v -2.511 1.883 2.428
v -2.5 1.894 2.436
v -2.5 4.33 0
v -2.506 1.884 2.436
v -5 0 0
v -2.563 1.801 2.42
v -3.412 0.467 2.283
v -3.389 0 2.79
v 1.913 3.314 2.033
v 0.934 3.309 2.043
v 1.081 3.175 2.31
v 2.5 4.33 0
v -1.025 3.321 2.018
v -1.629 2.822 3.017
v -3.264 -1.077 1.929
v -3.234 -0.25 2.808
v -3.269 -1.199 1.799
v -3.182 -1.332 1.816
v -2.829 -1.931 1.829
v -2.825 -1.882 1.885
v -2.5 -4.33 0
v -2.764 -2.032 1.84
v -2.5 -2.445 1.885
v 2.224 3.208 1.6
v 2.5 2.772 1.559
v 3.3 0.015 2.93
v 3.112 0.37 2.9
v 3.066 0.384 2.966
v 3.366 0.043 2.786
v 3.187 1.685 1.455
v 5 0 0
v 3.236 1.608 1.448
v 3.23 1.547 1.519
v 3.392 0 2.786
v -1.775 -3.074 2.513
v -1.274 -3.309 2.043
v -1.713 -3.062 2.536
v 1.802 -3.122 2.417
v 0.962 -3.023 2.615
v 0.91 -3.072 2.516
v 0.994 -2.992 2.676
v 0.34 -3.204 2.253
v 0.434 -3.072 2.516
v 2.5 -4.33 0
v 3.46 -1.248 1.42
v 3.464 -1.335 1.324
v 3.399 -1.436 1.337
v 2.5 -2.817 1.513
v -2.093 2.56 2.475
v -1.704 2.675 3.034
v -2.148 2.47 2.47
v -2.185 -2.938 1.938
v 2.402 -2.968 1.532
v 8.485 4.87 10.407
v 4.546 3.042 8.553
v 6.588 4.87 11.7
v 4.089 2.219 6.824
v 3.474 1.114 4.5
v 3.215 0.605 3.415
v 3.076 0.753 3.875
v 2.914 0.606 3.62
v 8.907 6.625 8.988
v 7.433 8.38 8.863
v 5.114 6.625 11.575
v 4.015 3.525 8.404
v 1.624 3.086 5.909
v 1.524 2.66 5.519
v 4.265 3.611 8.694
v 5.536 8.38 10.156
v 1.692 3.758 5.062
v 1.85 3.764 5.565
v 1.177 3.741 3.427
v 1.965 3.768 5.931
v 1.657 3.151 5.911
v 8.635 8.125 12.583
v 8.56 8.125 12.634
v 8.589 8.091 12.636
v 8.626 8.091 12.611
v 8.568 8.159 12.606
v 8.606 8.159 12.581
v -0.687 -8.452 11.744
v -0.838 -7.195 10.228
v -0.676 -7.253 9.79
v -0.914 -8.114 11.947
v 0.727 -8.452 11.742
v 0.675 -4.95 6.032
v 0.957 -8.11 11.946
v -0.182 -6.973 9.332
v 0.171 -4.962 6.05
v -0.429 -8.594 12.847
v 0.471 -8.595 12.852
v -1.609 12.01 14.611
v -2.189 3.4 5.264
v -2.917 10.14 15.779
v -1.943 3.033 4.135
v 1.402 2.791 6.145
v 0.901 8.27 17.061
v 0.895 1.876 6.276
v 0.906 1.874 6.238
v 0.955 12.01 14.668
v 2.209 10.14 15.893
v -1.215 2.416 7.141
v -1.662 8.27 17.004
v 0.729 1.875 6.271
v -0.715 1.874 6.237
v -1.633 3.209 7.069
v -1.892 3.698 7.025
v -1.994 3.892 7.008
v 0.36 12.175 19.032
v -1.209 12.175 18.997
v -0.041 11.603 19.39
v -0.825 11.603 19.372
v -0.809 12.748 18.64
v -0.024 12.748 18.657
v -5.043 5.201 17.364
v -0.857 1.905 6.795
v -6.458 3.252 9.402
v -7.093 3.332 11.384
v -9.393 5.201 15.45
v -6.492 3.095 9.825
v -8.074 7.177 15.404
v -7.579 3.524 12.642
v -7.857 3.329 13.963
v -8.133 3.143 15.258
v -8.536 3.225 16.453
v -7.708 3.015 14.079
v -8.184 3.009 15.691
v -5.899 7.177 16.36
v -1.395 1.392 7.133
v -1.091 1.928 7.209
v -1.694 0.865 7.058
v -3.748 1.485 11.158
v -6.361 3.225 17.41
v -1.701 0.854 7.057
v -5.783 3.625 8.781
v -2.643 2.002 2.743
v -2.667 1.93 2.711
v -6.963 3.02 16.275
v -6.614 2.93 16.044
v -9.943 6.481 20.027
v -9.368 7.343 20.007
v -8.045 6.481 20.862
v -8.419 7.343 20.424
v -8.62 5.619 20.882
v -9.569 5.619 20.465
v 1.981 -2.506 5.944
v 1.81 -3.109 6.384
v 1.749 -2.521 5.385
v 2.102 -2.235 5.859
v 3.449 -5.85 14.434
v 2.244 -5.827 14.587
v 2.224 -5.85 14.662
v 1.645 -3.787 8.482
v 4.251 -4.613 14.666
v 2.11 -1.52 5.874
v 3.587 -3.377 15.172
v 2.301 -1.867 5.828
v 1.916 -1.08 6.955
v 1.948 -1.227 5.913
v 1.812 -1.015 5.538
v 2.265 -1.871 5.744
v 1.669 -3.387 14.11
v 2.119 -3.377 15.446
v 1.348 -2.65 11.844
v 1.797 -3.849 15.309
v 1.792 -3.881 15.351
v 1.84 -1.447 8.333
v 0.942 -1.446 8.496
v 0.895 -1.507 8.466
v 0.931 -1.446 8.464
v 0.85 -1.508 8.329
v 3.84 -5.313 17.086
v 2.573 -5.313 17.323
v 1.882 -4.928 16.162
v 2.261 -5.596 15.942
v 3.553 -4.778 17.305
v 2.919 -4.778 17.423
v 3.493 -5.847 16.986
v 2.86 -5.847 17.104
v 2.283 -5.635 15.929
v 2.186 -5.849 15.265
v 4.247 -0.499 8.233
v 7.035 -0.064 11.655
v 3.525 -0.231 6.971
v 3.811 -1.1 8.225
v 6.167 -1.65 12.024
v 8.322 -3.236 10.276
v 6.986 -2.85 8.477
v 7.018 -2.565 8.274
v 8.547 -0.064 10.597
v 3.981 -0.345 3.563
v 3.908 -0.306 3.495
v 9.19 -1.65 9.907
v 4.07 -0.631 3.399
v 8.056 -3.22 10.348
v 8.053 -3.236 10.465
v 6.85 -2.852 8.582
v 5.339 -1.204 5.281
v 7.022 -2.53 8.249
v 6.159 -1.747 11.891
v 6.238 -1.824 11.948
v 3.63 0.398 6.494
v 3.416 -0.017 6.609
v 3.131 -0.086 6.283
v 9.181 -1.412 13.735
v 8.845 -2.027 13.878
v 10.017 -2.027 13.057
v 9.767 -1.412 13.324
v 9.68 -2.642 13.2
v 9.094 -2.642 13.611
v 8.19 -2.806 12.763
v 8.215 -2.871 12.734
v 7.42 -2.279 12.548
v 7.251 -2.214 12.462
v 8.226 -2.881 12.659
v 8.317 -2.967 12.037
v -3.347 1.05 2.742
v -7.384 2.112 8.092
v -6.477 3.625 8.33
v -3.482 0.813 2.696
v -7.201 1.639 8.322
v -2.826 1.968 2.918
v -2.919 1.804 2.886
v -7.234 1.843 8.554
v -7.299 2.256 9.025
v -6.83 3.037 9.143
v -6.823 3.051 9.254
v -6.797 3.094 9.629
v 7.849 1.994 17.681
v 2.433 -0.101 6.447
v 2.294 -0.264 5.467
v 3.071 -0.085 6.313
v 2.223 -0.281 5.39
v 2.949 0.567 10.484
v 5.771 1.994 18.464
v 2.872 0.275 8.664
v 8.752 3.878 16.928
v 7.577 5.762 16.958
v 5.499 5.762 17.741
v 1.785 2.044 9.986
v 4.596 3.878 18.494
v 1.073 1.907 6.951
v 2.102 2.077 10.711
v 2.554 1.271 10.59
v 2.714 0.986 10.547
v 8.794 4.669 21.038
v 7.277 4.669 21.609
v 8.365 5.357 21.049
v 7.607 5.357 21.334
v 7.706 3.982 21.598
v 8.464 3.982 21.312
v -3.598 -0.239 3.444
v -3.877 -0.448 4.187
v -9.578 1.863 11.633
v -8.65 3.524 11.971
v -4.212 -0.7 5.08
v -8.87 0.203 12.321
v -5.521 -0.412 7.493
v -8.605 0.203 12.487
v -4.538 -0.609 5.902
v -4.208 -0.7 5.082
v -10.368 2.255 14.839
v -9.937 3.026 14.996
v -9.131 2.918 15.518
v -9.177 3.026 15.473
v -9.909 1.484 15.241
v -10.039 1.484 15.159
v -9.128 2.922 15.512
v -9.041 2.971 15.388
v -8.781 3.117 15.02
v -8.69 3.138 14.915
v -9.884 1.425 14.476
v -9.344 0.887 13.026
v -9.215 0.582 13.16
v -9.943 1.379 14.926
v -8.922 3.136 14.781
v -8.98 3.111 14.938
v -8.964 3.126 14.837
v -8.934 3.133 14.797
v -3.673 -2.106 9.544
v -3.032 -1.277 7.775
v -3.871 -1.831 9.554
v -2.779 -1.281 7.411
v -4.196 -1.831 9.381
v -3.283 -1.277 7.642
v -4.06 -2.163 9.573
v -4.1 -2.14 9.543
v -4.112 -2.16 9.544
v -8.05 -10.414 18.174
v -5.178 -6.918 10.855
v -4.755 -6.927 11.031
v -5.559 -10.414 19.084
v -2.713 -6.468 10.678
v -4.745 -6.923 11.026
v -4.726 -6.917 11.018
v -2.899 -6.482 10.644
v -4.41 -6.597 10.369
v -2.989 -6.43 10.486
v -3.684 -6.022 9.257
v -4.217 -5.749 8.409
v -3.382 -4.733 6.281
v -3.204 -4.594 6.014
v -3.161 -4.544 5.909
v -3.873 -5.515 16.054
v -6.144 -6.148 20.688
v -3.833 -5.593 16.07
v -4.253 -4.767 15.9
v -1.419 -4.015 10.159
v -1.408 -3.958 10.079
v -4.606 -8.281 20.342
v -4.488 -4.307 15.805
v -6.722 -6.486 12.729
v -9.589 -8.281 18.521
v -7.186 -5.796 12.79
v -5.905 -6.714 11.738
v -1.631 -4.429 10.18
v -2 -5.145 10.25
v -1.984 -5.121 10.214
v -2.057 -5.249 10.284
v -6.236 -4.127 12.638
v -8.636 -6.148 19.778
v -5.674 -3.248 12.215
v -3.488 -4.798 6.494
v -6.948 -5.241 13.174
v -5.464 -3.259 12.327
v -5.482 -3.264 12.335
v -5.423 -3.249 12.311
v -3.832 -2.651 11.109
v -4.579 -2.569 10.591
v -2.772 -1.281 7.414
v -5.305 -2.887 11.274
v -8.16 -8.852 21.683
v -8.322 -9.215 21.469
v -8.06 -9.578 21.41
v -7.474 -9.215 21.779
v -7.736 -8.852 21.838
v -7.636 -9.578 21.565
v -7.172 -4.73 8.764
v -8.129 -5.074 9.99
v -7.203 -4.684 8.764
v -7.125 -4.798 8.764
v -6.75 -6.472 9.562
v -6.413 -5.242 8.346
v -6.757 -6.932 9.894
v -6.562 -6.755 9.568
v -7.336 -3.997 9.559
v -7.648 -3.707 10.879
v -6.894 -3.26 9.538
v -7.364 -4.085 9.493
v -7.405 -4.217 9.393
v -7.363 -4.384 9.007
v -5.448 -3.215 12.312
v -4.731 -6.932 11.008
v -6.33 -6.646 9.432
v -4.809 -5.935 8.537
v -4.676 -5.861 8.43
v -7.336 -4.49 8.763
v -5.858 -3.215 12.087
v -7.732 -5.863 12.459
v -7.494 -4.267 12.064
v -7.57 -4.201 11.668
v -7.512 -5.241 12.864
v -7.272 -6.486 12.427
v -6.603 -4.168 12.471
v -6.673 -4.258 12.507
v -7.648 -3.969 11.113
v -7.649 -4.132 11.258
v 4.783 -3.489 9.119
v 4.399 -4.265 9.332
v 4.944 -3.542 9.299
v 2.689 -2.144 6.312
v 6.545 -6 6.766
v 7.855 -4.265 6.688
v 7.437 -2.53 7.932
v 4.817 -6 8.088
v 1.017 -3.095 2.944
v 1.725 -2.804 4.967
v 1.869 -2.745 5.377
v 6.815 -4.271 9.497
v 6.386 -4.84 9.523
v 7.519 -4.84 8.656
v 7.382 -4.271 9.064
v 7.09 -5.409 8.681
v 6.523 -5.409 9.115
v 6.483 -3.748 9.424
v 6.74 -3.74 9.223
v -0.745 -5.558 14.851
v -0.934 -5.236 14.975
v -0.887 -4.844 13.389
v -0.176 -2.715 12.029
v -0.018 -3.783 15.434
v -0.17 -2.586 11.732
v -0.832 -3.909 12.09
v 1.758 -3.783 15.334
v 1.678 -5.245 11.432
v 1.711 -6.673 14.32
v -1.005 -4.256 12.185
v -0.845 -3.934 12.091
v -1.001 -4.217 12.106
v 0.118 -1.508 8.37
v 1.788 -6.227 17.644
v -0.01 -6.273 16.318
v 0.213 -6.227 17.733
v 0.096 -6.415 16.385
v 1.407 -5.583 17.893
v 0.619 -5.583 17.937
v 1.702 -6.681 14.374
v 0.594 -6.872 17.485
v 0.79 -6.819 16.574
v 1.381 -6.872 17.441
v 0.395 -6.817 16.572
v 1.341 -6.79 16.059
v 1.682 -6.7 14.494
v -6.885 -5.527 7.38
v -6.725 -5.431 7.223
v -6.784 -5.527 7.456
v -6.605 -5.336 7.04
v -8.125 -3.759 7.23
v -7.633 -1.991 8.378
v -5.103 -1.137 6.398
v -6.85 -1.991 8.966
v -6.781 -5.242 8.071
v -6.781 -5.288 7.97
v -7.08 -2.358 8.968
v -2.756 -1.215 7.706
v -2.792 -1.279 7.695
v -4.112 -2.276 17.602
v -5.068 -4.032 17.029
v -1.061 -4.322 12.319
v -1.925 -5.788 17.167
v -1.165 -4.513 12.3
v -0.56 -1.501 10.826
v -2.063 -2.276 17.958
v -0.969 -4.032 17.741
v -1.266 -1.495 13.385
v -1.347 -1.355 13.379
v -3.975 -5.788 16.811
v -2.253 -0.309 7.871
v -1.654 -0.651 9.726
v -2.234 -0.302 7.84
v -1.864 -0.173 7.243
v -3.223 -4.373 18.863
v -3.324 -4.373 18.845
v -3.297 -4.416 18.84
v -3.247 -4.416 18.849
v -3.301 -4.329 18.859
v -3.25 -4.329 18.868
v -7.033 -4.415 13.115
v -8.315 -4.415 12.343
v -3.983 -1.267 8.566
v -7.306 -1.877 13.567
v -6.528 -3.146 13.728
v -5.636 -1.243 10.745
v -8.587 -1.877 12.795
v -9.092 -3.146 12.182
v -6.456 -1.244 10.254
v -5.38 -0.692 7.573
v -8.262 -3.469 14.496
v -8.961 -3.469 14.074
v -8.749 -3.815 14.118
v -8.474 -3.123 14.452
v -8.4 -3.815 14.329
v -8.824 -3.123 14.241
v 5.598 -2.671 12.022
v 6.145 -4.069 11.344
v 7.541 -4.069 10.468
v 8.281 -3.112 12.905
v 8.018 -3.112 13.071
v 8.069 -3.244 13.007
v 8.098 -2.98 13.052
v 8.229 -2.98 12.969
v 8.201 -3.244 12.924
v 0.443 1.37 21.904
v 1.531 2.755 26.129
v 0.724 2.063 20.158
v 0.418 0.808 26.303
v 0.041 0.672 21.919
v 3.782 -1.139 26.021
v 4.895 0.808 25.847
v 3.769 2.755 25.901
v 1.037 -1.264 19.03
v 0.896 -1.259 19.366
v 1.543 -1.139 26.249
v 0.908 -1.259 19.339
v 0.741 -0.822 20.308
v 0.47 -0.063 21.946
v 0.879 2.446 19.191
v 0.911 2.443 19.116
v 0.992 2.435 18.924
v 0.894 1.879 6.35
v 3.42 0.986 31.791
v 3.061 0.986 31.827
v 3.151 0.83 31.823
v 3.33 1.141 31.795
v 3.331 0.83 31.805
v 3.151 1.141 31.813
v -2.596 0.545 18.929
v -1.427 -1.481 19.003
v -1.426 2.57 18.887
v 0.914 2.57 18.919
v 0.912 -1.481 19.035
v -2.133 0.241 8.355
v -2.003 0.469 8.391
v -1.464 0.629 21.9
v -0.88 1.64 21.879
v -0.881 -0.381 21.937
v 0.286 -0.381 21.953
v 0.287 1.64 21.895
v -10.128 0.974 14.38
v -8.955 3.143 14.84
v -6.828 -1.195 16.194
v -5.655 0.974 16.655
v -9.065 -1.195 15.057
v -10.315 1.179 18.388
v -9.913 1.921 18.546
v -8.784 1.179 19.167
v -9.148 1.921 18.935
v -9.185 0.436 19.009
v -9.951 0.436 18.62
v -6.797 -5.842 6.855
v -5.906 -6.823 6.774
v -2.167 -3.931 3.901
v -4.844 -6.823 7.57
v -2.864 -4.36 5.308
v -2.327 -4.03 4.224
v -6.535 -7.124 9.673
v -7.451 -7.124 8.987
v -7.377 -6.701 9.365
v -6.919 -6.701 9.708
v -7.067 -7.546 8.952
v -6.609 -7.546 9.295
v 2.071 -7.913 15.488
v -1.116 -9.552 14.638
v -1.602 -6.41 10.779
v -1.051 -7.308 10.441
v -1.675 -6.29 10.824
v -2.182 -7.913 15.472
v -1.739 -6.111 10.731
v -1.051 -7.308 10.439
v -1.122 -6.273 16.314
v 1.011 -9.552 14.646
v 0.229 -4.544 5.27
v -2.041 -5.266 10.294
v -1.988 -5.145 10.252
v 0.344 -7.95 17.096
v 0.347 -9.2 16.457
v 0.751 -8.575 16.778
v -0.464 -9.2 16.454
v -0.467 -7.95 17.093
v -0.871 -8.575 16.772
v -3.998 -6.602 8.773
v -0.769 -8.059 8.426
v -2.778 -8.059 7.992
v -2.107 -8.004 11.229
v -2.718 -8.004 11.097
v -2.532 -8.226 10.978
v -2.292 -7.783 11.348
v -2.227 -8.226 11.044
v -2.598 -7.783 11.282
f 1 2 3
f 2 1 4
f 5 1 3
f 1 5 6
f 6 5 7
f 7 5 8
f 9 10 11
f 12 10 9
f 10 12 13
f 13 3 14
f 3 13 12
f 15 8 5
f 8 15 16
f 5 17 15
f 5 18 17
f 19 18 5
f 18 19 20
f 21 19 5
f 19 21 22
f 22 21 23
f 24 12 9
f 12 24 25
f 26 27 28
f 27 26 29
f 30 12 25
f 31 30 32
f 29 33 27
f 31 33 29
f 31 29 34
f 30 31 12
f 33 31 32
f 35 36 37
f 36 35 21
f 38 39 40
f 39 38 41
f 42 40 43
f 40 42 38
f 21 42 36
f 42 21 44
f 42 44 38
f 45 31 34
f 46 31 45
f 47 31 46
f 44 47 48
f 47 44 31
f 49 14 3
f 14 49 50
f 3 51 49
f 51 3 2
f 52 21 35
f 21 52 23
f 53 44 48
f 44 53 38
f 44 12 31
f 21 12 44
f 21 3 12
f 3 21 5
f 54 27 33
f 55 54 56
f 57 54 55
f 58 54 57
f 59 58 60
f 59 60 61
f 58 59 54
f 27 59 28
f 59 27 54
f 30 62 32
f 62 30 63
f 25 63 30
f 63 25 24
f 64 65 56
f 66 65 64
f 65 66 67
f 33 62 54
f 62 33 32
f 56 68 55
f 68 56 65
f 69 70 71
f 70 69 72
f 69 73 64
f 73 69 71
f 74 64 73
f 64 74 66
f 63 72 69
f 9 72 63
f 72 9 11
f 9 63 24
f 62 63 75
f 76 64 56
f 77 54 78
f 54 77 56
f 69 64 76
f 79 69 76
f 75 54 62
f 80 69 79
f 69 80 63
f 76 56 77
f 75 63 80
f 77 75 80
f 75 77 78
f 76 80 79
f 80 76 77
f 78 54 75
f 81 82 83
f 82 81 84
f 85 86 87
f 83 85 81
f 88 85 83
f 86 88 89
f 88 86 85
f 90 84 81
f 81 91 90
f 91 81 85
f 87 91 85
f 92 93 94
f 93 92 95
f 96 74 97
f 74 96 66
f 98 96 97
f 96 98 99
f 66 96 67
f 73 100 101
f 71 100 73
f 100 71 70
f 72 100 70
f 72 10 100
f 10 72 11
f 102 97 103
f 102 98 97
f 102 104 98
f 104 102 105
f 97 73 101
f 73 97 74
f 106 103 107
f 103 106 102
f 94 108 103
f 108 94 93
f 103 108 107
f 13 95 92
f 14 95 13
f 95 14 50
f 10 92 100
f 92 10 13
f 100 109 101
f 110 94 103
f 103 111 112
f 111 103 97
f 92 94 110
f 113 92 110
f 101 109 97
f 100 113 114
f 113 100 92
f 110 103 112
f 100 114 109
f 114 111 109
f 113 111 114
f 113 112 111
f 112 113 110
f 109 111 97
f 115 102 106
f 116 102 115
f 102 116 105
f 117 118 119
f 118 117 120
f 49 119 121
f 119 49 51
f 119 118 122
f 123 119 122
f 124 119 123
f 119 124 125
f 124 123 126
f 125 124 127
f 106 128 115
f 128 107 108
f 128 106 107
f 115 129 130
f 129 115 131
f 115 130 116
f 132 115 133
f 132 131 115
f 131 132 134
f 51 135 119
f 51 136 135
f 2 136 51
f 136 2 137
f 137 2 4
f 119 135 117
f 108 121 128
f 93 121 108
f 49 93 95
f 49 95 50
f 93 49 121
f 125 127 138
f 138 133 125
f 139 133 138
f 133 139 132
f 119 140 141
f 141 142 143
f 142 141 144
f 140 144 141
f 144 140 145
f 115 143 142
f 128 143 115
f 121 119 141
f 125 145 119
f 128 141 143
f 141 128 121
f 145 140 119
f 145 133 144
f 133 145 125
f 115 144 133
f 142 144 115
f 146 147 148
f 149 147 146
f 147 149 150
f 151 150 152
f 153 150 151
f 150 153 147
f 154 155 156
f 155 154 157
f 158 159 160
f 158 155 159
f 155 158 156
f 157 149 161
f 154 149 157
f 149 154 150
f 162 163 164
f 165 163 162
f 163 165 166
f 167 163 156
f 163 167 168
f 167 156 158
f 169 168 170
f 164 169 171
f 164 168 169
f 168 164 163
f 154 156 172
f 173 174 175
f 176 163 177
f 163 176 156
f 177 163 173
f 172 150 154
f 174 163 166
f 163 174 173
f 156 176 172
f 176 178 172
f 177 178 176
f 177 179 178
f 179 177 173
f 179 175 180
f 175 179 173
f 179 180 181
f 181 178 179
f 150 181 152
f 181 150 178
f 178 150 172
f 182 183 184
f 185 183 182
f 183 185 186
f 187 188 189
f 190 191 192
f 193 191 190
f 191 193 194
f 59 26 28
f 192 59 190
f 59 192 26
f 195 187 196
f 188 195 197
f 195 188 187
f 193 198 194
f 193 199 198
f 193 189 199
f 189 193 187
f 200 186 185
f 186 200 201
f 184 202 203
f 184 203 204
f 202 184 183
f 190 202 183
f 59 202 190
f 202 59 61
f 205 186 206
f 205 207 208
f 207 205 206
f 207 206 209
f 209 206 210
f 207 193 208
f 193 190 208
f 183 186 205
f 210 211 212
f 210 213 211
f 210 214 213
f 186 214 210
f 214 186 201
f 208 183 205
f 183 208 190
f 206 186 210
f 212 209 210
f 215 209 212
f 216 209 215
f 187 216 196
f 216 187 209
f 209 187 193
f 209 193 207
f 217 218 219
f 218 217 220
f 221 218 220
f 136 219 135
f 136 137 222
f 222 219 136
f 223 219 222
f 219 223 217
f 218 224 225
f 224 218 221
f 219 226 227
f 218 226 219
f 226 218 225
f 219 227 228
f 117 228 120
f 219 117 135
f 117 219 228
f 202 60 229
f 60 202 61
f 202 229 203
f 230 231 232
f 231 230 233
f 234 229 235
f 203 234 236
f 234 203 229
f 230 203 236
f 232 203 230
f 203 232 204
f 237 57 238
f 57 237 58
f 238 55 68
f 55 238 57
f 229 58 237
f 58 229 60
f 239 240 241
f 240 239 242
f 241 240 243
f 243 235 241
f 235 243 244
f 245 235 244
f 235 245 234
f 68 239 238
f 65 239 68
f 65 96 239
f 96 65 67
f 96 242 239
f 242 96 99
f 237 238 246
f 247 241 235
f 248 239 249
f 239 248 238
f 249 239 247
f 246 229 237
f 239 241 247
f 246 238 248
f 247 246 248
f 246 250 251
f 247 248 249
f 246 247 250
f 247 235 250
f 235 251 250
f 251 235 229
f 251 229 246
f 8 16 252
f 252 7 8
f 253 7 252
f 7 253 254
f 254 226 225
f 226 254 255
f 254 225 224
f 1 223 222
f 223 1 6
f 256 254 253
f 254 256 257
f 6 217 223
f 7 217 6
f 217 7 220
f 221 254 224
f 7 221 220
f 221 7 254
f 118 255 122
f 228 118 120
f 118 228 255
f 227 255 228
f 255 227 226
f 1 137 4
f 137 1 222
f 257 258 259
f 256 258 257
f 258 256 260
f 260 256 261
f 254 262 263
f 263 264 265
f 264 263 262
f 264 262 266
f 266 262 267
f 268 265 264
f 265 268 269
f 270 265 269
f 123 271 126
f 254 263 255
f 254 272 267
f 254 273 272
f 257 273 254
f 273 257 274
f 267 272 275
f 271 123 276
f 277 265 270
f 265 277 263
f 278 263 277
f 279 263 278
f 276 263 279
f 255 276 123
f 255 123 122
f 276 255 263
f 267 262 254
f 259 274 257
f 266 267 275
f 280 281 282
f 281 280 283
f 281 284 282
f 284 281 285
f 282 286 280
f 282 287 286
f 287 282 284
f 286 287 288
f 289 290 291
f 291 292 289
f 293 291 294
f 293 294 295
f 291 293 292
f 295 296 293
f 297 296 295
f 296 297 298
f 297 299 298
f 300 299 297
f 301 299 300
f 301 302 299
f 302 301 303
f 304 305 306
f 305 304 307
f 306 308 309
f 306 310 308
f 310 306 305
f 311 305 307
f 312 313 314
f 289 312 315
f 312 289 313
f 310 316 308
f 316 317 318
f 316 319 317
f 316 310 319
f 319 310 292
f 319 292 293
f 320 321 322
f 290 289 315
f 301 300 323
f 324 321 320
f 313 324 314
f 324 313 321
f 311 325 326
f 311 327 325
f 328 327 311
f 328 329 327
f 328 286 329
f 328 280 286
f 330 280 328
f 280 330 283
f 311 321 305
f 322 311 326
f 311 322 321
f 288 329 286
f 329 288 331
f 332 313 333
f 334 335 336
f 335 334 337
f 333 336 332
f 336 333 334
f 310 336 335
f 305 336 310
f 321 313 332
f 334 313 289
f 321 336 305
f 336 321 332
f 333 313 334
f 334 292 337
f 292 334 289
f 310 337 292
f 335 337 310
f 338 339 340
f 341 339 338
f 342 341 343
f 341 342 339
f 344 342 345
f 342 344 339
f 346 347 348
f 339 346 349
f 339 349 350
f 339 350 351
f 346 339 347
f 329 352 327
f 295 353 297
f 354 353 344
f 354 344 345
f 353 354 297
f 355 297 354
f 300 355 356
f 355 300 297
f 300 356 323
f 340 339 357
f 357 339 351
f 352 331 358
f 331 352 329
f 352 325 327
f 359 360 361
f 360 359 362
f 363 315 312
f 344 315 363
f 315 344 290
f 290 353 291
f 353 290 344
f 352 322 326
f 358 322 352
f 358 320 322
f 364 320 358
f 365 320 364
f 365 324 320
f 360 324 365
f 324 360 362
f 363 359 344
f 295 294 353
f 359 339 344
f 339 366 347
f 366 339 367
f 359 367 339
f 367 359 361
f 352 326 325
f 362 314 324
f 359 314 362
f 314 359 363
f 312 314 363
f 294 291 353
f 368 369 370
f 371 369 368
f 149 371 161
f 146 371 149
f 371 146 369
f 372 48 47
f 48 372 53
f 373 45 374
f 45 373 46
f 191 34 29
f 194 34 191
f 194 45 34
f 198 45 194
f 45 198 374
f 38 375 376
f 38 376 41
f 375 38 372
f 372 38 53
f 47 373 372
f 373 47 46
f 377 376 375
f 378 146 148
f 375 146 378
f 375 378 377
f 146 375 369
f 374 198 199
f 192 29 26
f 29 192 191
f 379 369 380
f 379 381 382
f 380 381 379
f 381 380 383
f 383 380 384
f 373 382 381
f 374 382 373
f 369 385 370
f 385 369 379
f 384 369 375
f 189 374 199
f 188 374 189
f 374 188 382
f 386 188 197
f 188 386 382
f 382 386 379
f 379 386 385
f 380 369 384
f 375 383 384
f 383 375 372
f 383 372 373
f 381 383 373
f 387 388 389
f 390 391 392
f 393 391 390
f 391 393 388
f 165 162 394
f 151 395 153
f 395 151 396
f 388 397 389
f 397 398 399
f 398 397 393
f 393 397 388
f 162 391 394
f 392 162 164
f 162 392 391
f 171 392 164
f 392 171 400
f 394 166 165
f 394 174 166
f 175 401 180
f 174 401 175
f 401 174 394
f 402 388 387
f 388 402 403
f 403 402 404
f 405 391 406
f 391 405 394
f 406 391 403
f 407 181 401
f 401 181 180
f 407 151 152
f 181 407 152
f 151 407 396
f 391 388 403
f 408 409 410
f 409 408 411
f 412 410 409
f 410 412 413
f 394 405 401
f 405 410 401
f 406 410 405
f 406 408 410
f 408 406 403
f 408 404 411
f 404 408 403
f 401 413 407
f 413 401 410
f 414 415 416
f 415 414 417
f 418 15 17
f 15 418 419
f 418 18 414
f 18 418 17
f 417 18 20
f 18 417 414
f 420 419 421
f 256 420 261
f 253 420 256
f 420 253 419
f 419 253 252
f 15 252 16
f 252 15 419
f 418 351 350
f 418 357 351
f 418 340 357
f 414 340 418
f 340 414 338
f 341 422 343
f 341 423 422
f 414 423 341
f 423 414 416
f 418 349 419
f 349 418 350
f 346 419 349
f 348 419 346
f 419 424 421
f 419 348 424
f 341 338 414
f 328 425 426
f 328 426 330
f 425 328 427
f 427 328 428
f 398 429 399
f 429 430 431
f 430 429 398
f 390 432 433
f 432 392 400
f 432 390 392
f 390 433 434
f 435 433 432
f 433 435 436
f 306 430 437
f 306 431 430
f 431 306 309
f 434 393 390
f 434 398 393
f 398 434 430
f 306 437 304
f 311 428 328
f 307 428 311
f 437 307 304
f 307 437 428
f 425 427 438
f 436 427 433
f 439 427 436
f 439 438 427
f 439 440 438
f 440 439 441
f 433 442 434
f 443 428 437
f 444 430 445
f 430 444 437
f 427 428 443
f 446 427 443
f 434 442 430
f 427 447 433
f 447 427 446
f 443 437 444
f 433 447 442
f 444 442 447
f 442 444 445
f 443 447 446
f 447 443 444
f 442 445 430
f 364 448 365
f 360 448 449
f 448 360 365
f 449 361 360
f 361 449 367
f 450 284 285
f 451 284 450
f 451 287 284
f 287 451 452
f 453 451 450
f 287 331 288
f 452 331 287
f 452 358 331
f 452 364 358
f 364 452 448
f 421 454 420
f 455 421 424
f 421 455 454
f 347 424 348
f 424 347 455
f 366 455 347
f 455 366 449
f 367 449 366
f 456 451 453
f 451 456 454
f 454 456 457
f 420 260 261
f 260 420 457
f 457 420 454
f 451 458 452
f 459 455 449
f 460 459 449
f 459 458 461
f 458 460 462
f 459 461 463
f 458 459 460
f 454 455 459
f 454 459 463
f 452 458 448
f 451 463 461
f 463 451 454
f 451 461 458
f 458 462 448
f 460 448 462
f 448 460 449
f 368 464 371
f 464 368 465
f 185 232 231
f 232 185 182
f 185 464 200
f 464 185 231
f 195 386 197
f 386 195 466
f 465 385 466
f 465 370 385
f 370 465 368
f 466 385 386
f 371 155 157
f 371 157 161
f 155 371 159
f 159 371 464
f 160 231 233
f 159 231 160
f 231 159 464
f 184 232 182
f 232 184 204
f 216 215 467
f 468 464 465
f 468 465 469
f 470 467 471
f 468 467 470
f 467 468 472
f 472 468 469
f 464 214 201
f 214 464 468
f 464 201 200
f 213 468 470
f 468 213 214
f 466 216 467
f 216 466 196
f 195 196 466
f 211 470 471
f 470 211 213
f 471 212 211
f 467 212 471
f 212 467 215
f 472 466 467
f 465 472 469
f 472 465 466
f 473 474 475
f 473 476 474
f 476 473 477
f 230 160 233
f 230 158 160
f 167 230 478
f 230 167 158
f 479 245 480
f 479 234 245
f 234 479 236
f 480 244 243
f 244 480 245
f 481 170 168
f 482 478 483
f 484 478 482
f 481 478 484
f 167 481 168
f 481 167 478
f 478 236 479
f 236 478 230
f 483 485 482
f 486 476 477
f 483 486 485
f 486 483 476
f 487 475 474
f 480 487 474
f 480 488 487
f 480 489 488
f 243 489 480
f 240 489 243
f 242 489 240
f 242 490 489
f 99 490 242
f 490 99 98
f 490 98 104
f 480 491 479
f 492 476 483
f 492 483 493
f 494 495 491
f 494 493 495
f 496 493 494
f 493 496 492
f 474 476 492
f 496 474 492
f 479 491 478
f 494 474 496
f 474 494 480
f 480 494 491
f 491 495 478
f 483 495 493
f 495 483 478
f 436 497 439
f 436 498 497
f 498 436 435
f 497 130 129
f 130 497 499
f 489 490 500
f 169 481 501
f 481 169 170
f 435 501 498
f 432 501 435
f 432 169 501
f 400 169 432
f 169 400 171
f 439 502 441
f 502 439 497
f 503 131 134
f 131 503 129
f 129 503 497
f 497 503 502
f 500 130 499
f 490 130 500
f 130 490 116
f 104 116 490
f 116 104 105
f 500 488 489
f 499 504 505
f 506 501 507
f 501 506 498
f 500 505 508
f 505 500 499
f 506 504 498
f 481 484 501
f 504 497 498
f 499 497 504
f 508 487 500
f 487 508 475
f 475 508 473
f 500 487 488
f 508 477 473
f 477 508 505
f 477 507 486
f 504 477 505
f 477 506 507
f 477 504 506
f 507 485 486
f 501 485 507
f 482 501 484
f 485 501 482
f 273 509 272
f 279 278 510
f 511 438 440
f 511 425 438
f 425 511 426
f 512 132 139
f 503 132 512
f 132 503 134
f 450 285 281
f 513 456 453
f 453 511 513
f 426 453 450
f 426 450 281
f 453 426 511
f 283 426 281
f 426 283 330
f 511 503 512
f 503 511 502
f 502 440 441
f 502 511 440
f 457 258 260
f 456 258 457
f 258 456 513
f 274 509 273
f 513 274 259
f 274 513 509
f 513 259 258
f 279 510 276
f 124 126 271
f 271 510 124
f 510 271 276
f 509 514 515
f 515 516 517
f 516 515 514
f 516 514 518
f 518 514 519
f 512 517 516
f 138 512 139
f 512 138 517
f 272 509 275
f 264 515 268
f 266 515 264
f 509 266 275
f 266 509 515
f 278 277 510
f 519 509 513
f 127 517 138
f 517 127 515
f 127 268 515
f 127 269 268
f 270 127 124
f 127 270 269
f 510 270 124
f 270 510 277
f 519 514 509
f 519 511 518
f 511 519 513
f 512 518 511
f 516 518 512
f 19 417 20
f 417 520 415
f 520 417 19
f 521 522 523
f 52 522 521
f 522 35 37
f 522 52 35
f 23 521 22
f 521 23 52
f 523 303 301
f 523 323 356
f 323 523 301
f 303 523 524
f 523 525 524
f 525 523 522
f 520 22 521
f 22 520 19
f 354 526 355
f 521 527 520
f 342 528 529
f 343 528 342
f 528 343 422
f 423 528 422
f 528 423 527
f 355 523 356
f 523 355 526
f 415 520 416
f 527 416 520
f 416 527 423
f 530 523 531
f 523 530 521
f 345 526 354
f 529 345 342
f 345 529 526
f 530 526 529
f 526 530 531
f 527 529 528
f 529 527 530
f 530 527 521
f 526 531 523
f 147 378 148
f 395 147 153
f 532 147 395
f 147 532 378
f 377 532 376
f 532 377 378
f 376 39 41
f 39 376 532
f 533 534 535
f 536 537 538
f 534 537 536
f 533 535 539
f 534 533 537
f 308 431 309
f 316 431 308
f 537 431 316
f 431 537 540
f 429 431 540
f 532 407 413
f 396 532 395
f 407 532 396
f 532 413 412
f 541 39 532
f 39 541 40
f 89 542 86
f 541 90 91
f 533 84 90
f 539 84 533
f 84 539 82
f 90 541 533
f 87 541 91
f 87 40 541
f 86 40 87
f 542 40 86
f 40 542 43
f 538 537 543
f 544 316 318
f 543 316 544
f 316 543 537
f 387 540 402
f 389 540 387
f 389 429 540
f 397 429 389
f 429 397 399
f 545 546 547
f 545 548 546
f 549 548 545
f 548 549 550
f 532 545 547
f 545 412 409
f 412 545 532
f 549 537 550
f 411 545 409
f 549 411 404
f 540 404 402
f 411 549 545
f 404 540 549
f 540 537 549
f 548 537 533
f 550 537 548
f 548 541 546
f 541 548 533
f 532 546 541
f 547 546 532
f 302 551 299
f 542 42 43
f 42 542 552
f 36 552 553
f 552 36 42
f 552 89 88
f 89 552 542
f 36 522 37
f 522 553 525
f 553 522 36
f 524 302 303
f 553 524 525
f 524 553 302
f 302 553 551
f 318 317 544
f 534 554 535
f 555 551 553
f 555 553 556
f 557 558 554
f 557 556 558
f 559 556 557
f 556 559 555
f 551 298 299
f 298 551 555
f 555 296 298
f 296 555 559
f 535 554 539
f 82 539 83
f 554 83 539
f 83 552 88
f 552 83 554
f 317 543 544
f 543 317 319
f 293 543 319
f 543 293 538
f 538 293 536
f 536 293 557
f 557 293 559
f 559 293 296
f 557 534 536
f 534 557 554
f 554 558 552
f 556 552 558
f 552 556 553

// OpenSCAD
/*

Random crystal generator for Thingiverse Customizer

Fernando Jerez 2016

*/

// This is only to force Customizer create many files. Changes doesnt matter. Just click CREATE THING
part = "one"; // [one:Crystal #1, two:Crystal #2, three:Crystal #3, four:Crystal #4,five:Crystal #5,six:Crystal #6,seven:Crystal #7,eight:Crystal #8,nine:Crystal #9,ten:Crystal #10]

/* [Hidden] */
crystalrock();

module crystalrock(){
    union(){
        semisphere(5,$fn=6);
        for(i = [1:25]){
            angleX = 40;
            angleY = 40;
            g1 = randomInt(-angleX, angleX);
            g2 = randomInt(-angleY, angleY);
        
            lados = 6; 
            radio1 = randomInt(1, 2);
            radio2 = randomInt(1.1, 1.6) * radio1;
            radio3 = randomInt(0, 0.5) * radio2;

            altura = radio1 * randomInt(1, 2) * 5 * (0.5 + pow((abs(cos(g1) * cos(g2))), 4));
            pico = randomInt(0.1, 0.3) * altura;    
         
            rotate([g1, g2, 0])
                translate([0, 0, 3])
                    crystal(lados, radio1, radio2, radio3, altura, pico);
        }
    }
}

/**
 * min_value: Minimum value of random number range
 * max_value: Maximum value of random number range
 * value_count: Number of random numbers to return as a vector
 * seed_value (optional)
 */
function randomInt(min_value, max_value) = rands(min_value, max_value, 1)[0];


module crystal(lados,radio1,radio2,radio3,altura,pico){
    cylinder(r1=radio1, r2=radio2, h=altura,$fn=lados);
    translate([0,0,altura])
        cylinder(r1=radio2,r2=radio3,h=pico,$fn=lados);
}

module semisphere(r){
    difference(){
        sphere(r); 
        translate([0,0,-r]) cube([2*r,2*r,2*r],center = true);
    }
}
